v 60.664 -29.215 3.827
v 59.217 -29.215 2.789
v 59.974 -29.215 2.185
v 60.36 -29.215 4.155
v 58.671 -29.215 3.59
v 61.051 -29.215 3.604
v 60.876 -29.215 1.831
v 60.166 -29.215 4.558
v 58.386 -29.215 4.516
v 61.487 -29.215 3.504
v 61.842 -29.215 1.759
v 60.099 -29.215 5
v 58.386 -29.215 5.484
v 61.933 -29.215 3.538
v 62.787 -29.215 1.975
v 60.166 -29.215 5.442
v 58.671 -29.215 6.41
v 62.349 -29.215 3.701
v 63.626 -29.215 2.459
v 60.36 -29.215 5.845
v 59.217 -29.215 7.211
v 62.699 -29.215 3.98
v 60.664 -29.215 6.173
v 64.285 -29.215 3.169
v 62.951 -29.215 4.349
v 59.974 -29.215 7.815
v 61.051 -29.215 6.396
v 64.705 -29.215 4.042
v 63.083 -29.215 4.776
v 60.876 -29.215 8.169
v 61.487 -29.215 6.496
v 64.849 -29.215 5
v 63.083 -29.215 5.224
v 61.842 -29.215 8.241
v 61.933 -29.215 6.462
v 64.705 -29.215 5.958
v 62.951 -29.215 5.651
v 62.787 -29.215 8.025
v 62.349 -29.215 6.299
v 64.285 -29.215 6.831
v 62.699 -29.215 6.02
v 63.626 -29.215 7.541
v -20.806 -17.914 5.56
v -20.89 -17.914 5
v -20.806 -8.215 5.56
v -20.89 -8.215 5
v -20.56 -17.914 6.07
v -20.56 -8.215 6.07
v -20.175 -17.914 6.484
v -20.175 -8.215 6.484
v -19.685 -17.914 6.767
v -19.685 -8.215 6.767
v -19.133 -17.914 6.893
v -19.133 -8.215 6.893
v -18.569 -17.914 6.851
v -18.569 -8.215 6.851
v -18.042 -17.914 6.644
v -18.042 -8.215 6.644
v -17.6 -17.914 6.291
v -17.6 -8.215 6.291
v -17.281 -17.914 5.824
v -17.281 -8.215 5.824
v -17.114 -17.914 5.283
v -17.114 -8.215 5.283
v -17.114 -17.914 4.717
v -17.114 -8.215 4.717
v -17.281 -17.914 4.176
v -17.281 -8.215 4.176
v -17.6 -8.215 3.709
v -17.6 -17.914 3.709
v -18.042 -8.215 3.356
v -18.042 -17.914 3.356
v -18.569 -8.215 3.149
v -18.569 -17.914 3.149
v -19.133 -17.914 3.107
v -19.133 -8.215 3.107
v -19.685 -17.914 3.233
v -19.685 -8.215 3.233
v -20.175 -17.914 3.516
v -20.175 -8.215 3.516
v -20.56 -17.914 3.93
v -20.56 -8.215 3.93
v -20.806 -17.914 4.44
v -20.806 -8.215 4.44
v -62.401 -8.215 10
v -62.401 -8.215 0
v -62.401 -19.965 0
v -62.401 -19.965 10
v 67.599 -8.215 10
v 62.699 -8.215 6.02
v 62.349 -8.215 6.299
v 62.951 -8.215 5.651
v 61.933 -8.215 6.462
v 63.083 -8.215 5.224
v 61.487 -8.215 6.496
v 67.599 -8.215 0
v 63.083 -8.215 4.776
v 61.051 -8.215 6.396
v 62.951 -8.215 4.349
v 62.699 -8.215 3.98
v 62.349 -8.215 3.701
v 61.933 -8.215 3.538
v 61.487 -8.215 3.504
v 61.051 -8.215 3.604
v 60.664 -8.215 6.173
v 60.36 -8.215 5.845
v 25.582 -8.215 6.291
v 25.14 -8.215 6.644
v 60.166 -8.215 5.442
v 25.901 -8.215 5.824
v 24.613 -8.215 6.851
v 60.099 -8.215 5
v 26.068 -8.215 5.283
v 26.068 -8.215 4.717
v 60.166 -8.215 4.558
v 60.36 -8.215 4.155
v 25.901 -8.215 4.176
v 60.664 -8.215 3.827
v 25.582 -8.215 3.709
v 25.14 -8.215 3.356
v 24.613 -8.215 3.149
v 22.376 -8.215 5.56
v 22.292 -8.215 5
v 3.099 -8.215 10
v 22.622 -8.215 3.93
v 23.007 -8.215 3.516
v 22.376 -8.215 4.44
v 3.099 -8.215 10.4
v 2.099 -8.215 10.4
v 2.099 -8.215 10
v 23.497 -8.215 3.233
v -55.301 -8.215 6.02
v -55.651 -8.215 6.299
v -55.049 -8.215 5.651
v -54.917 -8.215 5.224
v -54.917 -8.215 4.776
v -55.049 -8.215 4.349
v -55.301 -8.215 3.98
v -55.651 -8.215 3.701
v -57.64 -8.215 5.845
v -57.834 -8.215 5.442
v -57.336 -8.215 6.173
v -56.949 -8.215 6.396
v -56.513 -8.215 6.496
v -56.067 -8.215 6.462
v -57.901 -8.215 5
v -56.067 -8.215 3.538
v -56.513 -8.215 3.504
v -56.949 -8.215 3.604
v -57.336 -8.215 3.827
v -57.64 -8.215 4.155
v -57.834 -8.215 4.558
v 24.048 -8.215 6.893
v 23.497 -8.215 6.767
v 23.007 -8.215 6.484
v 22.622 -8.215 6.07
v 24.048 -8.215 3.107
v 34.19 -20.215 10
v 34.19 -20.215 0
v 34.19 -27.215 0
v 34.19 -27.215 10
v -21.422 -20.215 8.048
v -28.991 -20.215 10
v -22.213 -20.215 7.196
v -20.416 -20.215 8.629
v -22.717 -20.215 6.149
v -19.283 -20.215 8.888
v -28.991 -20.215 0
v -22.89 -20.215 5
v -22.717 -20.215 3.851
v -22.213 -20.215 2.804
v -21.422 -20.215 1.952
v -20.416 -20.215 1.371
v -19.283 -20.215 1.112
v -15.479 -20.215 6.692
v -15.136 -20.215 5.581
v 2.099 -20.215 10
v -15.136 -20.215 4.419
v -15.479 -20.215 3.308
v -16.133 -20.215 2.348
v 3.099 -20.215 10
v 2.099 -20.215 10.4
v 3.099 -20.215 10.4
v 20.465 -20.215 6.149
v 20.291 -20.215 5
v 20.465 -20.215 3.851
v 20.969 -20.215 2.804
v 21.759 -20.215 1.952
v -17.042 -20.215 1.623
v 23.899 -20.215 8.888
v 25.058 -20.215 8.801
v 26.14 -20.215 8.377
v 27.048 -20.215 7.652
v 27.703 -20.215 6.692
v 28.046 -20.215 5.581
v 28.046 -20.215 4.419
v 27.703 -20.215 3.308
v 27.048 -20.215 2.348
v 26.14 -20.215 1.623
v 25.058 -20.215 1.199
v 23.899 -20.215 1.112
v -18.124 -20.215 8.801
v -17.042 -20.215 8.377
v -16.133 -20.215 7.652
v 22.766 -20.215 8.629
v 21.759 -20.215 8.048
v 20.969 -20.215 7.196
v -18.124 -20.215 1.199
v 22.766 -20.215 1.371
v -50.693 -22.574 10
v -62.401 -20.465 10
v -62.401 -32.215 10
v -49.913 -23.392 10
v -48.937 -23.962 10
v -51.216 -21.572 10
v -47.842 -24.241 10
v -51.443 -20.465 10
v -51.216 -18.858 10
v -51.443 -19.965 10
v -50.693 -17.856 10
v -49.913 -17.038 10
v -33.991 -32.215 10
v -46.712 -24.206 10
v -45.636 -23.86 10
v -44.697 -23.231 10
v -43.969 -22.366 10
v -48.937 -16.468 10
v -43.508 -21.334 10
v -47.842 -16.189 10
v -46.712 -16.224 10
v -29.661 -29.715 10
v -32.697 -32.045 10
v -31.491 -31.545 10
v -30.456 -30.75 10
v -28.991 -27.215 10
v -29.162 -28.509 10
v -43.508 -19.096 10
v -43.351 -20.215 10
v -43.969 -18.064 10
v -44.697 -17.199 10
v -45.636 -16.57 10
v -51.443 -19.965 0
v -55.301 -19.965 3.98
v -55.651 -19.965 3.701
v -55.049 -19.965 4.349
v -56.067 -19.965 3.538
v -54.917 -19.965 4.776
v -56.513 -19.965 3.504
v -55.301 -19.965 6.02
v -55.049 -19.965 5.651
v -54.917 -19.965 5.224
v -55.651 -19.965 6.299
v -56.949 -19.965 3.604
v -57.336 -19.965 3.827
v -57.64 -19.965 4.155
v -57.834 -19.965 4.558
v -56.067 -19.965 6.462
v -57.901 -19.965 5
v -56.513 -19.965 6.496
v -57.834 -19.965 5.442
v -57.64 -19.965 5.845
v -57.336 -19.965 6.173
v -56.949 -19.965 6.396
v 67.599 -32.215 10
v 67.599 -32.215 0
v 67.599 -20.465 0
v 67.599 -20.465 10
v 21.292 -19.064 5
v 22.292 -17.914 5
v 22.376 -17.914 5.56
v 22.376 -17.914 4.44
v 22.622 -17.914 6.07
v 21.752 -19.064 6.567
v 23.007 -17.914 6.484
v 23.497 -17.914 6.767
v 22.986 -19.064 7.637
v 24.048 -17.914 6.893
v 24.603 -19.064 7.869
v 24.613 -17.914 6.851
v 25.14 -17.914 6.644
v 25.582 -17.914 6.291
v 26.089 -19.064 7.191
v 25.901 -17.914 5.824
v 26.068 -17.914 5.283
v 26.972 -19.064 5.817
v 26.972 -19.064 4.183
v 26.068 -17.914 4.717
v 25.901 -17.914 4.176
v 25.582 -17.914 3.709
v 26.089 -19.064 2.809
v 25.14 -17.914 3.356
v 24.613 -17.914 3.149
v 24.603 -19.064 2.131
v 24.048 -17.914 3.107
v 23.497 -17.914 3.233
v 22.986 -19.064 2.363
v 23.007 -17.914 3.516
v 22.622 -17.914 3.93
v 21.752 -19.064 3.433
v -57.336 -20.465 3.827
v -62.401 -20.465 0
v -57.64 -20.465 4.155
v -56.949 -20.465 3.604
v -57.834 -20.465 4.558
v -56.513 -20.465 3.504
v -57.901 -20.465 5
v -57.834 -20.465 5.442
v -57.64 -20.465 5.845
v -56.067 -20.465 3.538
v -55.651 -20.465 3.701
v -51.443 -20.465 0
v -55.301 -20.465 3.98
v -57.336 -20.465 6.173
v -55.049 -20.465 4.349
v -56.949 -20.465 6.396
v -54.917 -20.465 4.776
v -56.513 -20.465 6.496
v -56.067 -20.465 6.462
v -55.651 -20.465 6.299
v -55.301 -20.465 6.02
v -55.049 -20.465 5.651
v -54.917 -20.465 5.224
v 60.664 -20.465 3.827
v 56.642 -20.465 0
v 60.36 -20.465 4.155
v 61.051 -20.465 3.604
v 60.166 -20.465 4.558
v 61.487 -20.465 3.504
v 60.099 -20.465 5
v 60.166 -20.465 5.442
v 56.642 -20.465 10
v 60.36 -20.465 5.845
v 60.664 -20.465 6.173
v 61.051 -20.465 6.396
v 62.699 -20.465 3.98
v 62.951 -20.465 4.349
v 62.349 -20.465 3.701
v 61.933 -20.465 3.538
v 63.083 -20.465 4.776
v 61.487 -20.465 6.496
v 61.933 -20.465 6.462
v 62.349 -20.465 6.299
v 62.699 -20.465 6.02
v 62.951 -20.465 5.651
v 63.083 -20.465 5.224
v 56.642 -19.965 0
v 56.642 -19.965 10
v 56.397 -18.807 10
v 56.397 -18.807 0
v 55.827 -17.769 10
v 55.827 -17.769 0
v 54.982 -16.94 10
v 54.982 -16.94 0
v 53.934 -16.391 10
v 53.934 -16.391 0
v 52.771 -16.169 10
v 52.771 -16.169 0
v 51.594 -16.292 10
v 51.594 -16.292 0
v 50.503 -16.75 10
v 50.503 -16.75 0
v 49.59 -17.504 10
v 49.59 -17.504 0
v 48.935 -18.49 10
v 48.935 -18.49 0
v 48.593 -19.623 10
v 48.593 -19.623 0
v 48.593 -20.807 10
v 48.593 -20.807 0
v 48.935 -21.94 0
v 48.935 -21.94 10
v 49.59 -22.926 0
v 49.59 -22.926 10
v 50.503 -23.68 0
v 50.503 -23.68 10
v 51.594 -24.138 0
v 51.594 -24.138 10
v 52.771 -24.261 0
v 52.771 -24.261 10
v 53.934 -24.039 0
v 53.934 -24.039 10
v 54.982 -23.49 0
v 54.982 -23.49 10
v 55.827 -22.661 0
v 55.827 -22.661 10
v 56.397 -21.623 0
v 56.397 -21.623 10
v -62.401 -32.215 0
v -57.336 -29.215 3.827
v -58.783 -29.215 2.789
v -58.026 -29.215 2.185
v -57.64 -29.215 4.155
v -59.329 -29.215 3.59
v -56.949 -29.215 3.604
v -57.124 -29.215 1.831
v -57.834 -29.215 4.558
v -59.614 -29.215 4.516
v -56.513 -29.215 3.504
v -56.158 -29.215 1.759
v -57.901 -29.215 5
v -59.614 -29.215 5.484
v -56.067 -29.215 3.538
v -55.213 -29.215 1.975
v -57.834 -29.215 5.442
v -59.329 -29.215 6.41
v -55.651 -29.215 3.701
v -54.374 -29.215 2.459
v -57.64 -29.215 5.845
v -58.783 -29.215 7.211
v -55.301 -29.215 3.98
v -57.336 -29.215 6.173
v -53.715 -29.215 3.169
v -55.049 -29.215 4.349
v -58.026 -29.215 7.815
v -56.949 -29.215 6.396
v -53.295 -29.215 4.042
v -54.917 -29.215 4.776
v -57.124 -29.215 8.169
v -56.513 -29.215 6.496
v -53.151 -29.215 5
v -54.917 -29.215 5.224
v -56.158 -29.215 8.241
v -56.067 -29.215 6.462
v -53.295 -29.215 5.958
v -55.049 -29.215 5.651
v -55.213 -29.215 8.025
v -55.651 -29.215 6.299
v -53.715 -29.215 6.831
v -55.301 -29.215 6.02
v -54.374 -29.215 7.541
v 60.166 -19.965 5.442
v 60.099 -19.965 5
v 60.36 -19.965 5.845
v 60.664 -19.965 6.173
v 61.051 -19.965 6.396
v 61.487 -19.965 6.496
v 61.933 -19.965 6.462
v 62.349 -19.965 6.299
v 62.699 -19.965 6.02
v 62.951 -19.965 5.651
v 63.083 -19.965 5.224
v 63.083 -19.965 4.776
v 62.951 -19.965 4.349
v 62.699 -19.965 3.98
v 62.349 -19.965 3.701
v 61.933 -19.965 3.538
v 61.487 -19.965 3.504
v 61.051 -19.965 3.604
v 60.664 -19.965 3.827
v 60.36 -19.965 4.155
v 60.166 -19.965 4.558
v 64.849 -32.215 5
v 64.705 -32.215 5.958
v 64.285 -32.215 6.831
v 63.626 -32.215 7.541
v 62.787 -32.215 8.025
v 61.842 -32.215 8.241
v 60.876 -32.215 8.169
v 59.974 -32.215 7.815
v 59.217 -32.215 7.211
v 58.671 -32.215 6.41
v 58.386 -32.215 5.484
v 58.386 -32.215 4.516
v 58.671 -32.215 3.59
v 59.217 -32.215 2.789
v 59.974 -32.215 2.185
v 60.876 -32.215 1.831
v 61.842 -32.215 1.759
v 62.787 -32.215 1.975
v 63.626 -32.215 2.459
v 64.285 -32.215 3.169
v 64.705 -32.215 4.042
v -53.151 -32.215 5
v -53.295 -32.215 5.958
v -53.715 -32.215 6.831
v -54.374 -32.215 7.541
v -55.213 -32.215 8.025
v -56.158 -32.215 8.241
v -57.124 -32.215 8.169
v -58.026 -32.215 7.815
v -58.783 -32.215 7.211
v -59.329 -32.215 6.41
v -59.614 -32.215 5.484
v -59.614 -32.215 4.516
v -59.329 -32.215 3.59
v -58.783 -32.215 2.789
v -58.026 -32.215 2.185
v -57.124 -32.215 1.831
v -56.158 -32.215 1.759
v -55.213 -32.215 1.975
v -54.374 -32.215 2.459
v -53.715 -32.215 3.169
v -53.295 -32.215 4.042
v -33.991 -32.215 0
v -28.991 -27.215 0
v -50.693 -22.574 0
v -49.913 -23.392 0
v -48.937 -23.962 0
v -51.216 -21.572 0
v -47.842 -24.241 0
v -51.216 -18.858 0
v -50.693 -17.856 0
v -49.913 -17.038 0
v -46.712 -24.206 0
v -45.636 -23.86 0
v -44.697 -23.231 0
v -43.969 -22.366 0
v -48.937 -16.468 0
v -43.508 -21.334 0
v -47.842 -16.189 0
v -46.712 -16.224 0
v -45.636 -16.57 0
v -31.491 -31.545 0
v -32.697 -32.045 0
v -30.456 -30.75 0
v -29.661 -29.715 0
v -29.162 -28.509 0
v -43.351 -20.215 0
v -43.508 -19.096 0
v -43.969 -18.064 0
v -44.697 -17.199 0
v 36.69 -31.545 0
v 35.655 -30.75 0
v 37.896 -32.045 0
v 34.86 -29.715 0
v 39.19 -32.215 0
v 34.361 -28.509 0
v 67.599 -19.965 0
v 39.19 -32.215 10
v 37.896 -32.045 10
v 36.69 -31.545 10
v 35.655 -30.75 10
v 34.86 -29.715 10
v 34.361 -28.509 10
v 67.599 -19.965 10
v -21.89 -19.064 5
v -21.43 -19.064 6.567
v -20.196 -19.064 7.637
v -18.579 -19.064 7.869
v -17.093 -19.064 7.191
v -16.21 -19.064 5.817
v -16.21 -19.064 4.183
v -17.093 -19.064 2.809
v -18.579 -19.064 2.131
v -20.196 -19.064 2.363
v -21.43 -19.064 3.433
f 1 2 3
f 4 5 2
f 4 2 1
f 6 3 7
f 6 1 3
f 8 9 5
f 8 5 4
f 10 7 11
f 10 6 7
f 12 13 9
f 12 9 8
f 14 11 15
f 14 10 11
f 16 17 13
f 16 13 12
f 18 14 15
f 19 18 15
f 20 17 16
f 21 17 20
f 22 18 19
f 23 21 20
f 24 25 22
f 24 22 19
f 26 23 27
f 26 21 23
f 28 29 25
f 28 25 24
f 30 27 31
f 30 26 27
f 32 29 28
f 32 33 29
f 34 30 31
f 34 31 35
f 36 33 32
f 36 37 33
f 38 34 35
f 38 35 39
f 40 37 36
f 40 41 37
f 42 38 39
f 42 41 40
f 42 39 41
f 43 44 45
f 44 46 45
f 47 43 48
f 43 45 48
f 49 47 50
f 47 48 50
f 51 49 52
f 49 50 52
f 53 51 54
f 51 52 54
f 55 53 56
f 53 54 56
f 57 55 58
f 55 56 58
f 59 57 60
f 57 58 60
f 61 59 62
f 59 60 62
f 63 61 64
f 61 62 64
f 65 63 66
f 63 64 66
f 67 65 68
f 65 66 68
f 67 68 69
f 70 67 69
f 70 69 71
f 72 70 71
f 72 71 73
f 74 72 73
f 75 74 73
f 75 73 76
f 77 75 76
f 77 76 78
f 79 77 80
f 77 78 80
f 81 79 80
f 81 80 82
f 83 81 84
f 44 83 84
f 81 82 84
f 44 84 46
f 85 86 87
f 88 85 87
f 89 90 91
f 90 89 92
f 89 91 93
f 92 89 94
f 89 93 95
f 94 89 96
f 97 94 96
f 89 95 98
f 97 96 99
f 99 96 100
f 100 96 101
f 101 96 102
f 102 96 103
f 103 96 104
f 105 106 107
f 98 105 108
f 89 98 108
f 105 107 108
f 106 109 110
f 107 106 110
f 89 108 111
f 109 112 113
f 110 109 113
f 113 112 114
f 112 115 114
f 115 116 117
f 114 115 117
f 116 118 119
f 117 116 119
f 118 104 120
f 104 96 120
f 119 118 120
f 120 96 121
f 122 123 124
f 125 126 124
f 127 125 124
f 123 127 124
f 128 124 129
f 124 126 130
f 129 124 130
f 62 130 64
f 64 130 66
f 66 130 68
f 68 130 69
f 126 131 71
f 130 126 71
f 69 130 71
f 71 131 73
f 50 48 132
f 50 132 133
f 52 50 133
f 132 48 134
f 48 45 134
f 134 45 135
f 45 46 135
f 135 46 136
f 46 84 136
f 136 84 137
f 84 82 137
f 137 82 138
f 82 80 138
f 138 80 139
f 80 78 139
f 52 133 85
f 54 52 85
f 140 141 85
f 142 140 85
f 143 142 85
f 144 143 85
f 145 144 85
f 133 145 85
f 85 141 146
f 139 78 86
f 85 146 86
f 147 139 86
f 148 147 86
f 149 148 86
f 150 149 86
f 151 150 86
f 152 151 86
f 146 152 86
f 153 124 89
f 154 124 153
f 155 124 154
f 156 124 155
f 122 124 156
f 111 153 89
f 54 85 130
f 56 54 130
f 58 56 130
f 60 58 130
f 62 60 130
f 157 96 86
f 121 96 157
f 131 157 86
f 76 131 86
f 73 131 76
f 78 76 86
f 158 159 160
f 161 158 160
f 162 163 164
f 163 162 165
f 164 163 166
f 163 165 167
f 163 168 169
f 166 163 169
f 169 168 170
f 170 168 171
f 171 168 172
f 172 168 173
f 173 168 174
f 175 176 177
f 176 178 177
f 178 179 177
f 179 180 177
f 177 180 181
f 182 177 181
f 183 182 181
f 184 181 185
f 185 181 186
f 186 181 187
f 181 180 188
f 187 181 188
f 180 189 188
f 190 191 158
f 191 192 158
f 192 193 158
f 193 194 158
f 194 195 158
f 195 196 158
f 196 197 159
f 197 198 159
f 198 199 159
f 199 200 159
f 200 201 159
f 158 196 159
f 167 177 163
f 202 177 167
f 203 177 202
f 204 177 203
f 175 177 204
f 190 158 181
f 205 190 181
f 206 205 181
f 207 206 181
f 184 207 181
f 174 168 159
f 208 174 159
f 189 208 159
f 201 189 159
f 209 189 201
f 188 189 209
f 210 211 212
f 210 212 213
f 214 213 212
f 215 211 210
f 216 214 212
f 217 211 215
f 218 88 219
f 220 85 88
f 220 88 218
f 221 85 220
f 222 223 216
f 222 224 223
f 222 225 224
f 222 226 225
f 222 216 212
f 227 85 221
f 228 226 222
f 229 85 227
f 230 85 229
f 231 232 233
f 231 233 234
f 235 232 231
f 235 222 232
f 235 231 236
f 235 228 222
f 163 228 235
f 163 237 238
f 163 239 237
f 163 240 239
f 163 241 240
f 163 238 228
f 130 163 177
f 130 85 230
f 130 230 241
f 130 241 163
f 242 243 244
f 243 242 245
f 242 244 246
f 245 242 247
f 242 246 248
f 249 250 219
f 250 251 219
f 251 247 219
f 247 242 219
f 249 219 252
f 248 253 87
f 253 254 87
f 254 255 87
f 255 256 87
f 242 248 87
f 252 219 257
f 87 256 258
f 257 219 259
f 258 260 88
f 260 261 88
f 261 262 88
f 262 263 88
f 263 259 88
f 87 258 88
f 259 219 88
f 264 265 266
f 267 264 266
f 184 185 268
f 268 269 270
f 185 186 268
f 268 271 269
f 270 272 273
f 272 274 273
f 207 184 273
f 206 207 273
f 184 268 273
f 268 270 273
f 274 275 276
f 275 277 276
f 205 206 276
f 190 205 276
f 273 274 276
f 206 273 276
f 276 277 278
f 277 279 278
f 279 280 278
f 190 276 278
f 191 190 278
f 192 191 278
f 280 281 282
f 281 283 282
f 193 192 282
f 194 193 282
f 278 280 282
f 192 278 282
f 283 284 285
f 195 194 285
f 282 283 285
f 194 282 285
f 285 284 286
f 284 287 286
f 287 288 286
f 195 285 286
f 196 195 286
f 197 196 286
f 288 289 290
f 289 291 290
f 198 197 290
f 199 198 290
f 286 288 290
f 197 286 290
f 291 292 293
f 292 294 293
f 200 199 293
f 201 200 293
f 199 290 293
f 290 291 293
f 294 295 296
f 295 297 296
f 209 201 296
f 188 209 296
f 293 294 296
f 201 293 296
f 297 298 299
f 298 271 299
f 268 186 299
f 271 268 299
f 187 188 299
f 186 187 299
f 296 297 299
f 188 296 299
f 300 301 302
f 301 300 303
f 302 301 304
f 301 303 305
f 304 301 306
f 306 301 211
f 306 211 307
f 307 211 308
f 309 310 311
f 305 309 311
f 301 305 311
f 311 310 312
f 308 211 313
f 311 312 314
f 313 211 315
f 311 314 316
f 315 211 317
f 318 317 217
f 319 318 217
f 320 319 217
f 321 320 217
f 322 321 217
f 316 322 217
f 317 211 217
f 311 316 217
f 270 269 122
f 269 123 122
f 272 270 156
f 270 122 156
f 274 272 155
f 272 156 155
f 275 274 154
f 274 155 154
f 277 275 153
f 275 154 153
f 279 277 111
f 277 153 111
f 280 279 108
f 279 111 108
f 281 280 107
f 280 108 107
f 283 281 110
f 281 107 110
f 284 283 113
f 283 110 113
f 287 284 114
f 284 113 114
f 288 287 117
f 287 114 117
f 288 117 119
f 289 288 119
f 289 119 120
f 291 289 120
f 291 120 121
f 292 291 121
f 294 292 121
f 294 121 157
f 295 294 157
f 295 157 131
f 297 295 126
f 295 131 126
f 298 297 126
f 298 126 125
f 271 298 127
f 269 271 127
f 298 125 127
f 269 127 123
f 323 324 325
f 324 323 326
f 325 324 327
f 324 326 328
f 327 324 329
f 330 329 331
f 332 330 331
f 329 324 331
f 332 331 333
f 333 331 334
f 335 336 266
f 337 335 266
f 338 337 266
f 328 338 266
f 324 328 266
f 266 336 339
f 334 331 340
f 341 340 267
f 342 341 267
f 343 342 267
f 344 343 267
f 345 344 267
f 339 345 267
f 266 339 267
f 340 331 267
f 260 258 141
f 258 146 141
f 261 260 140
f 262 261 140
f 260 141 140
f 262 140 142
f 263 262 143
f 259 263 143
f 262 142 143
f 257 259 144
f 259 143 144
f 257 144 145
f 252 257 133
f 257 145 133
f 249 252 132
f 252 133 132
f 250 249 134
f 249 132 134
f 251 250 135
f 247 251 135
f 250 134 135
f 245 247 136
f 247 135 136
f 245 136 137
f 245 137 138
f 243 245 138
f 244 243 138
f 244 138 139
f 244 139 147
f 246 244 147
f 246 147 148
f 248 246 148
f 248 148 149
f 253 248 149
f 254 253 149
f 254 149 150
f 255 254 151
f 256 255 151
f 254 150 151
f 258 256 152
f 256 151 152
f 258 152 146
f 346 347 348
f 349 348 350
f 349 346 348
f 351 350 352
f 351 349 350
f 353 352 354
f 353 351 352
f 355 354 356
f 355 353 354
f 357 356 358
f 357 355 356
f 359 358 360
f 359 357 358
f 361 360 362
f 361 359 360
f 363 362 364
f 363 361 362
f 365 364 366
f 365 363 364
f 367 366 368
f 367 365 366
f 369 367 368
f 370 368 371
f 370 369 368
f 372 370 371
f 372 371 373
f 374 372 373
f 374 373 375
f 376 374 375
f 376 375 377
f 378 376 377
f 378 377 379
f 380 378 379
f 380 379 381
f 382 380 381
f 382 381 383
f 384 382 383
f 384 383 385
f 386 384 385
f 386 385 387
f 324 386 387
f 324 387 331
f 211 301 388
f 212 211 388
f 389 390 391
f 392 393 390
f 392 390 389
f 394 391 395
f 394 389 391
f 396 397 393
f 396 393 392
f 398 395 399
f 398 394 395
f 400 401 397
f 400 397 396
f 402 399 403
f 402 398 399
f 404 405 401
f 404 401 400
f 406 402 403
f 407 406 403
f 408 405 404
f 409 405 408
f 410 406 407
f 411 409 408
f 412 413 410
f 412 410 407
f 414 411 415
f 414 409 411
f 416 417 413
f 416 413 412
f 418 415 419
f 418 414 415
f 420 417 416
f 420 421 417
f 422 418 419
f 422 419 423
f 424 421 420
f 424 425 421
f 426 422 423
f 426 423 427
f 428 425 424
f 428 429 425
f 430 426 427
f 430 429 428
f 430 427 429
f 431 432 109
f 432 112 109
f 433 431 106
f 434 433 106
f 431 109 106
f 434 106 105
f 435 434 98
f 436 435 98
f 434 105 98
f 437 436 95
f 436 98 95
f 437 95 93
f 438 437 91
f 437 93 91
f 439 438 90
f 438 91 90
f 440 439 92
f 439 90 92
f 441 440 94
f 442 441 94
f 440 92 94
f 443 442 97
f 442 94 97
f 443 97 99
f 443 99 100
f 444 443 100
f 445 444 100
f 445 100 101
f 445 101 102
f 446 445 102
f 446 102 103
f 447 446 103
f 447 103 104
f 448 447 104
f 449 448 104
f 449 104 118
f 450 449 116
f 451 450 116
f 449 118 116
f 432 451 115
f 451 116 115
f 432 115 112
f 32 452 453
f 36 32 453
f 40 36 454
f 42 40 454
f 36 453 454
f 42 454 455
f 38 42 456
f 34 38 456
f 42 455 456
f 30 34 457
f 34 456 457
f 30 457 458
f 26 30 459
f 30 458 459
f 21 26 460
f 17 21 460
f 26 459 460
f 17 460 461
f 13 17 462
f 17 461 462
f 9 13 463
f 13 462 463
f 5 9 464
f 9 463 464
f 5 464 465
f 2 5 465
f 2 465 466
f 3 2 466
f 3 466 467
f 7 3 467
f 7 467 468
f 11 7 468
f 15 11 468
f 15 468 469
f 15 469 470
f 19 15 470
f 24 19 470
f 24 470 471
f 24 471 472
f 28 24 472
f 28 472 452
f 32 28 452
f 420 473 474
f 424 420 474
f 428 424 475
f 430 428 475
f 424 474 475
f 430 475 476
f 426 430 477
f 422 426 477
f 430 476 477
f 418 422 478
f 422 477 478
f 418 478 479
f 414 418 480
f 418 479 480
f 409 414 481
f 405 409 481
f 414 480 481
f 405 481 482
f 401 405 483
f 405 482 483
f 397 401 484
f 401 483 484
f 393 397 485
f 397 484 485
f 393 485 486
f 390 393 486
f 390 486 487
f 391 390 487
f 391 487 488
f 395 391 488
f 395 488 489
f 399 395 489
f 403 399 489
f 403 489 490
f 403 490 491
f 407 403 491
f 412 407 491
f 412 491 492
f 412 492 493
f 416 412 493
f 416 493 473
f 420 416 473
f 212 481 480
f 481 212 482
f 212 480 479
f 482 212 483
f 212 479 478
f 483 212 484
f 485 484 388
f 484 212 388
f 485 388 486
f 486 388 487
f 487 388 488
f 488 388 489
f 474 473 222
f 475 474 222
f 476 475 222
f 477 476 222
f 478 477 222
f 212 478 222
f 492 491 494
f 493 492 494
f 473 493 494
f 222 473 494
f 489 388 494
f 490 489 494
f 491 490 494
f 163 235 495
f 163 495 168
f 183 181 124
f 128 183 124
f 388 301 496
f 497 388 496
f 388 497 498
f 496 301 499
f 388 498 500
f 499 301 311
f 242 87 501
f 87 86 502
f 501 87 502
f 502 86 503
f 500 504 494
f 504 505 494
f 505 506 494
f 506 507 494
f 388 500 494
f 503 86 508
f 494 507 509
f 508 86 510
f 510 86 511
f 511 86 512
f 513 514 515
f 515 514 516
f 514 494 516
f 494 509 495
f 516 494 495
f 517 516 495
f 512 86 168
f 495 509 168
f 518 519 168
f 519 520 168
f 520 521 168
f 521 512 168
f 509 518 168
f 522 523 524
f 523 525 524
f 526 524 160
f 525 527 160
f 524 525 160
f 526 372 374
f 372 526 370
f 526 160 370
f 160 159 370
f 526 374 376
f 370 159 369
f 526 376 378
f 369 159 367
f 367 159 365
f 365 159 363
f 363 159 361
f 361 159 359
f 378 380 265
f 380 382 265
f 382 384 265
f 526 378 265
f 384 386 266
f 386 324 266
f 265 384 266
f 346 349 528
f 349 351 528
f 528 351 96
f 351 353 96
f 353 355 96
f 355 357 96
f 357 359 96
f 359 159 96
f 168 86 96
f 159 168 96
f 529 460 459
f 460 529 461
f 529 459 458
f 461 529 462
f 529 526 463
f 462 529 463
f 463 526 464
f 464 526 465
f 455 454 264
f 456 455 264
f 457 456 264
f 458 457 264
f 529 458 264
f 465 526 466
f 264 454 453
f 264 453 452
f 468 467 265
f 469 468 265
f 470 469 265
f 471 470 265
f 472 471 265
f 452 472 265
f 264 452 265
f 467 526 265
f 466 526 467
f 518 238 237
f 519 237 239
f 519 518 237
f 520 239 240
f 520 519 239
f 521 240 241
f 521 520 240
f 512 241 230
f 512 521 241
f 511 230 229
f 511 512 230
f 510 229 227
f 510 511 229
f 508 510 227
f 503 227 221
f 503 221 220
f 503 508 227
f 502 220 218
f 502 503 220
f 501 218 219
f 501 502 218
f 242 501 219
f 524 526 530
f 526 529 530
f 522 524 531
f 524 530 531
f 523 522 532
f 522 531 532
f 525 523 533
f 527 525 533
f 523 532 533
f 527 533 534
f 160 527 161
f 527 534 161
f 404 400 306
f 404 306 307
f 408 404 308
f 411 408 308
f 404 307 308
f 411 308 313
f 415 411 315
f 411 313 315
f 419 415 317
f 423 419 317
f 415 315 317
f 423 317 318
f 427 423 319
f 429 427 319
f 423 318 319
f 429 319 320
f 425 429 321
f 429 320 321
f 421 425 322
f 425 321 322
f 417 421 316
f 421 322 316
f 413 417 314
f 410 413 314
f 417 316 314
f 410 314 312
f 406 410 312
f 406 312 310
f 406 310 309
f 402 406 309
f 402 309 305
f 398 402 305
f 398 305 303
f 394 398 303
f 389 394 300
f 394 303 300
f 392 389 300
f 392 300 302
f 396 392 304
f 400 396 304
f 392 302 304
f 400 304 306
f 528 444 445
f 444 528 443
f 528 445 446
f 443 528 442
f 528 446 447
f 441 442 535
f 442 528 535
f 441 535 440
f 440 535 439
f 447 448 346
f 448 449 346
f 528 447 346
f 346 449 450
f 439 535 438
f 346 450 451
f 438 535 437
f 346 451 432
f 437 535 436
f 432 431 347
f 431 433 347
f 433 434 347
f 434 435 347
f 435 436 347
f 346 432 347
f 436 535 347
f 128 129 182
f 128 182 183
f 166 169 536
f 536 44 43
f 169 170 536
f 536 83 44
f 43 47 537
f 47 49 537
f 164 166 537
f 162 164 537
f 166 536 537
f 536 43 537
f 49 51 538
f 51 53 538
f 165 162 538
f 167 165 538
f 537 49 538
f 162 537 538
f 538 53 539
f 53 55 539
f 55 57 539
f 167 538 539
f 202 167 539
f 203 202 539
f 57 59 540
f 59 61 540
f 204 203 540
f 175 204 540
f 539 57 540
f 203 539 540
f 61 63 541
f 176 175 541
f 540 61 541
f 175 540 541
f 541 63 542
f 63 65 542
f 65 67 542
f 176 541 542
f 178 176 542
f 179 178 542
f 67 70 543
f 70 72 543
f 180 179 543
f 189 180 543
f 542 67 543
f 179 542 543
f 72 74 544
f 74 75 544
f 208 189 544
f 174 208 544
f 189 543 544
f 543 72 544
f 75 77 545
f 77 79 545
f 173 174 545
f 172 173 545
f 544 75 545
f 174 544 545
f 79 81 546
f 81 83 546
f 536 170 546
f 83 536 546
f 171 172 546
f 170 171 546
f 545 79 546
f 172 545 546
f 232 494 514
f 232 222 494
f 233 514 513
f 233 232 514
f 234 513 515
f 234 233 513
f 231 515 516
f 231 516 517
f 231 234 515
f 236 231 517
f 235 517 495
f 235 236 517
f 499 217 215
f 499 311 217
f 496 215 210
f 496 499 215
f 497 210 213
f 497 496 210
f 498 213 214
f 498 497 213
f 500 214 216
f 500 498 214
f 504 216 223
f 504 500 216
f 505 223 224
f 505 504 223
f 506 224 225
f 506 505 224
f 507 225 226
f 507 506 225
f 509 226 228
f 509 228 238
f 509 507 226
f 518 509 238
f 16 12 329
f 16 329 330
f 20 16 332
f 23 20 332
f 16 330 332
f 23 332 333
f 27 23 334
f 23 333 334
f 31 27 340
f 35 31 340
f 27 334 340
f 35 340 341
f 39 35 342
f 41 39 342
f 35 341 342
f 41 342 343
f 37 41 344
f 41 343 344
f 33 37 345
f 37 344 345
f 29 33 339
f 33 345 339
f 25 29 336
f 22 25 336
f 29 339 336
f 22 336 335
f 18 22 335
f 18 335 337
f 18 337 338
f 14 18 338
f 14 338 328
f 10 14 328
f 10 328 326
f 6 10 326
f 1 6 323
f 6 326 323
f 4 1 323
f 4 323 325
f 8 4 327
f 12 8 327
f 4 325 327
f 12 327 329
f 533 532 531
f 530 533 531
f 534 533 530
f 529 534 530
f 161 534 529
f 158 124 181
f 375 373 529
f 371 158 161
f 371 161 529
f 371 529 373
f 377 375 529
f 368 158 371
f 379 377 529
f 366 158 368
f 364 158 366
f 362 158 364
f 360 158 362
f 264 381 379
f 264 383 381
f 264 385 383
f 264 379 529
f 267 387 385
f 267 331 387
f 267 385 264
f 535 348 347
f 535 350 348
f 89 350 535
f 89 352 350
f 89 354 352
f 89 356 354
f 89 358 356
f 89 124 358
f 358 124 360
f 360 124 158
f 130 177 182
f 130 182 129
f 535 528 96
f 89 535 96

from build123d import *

# Parameters (mm, degrees)
F0_R            = 4.05
F1_DEPTH        = 10
F2_R            = 5
F4_D            = 3.7973
F4_CSINK_D      = 7.7978
F4_CSINK_ANGLE  = 82
F5_W            = 1
F5_H            = 12
F6_DEPTH        = 0.4
F8_DEPTH        = 25
F10_D           = 3
F10_CBORE_D     = 6.5
F10_CBORE_DEPTH = 3


with BuildPart() as f1:
    # F0 (on Top) → F1 (new body)
    with BuildSketch(Plane.XY):
        Polygon((67.5994434953, -8.2149432153), (-62.4005565047, -8.2149432153), (-62.4005565047, -32.2149432153), (-28.9914757013, -32.2149432153), (-28.9914757013, -20.2149432153), (34.1903626919, -20.2149432153), (34.1903626919, -32.2149432153), (67.5994434953, -32.2149432153), align=None)
        with Locations((-47.4005565047, -20.2149432153)):
            Circle(F0_R, mode=Mode.SUBTRACT)
        with Locations((52.5994434953, -20.2149432153)):
            Circle(F0_R, mode=Mode.SUBTRACT)
    extrude(amount=F1_DEPTH)

    # F2
    f2_edges = [f1.edges().sort_by_distance(p)[0] for p in [
        (34.190363, -32.214943, 5),
        (-28.991476, -32.214943, 5),
    ]]
    fillet(f2_edges, radius=F2_R)

    # F4 (through all)
    with Locations(Plane.XZ.offset(20.2149432153)):
        with Locations((-18.9914757013, 5), (24.1903626919, 5)):
            CounterSinkHole(F4_D / 2, F4_CSINK_D / 2, counter_sink_angle=F4_CSINK_ANGLE)

    # F5 (on face) → F6 (join)
    with BuildSketch(Plane.XY.offset(10)):
        with Locations((2.5994434953, -14.2149432153)):
            Rectangle(F5_W, F5_H)
    extrude(amount=F6_DEPTH)

    # F7 (on face) → F8 (cut)
    with BuildSketch(Plane.XY.offset(10)):
        with BuildLine():
            ThreePointArc((56.6417200816, -19.9649432153), (56.6475121814, -20.0898835784), (56.6494434953, -20.2149432153))
            ThreePointArc((56.6494434953, -20.2149432153), (56.6475121814, -20.3400028521), (56.6417200816, -20.4649432153))
            Line((56.6417200816, -20.4649432153), (67.5994434953, -20.4649432153))
            Line((67.5994434953, -20.4649432153), (67.5994434953, -19.9649432153))
            Line((67.5994434953, -19.9649432153), (56.6417200816, -19.9649432153))
        make_face()
        with BuildLine():
            Line((-51.442833091, -19.9649432153), (-62.4005565047, -19.9649432153))
            Line((-62.4005565047, -19.9649432153), (-62.4005565047, -20.4649432153))
            Line((-62.4005565047, -20.4649432153), (-51.442833091, -20.4649432153))
            ThreePointArc((-51.442833091, -20.4649432153), (-51.4505565047, -20.2149432153), (-51.442833091, -19.9649432153))
        make_face()
        with BuildLine():
            Line((-51.442833091, -20.4649432153), (-51.442833091, -19.9649432153))
            ThreePointArc((-51.442833091, -19.9649432153), (-51.4505565047, -20.2149432153), (-51.442833091, -20.4649432153))
        make_face()
        with BuildLine():
            ThreePointArc((56.6417200816, -20.4649432153), (56.6475121814, -20.3400028521), (56.6494434953, -20.2149432153))
            ThreePointArc((56.6494434953, -20.2149432153), (56.6475121814, -20.0898835784), (56.6417200816, -19.9649432153))
            Line((56.6417200816, -19.9649432153), (56.6417200816, -20.4649432153))
        make_face()
    extrude(amount=-F8_DEPTH, mode=Mode.SUBTRACT)

    # F10 (through all)
    with Locations(Plane.XZ.offset(32.2149432153)):
        with Locations((61.5994434953, 5), (-56.4005565047, 5)):
            CounterBoreHole(F10_D / 2, F10_CBORE_D / 2, F10_CBORE_DEPTH)


solid = f1.part
